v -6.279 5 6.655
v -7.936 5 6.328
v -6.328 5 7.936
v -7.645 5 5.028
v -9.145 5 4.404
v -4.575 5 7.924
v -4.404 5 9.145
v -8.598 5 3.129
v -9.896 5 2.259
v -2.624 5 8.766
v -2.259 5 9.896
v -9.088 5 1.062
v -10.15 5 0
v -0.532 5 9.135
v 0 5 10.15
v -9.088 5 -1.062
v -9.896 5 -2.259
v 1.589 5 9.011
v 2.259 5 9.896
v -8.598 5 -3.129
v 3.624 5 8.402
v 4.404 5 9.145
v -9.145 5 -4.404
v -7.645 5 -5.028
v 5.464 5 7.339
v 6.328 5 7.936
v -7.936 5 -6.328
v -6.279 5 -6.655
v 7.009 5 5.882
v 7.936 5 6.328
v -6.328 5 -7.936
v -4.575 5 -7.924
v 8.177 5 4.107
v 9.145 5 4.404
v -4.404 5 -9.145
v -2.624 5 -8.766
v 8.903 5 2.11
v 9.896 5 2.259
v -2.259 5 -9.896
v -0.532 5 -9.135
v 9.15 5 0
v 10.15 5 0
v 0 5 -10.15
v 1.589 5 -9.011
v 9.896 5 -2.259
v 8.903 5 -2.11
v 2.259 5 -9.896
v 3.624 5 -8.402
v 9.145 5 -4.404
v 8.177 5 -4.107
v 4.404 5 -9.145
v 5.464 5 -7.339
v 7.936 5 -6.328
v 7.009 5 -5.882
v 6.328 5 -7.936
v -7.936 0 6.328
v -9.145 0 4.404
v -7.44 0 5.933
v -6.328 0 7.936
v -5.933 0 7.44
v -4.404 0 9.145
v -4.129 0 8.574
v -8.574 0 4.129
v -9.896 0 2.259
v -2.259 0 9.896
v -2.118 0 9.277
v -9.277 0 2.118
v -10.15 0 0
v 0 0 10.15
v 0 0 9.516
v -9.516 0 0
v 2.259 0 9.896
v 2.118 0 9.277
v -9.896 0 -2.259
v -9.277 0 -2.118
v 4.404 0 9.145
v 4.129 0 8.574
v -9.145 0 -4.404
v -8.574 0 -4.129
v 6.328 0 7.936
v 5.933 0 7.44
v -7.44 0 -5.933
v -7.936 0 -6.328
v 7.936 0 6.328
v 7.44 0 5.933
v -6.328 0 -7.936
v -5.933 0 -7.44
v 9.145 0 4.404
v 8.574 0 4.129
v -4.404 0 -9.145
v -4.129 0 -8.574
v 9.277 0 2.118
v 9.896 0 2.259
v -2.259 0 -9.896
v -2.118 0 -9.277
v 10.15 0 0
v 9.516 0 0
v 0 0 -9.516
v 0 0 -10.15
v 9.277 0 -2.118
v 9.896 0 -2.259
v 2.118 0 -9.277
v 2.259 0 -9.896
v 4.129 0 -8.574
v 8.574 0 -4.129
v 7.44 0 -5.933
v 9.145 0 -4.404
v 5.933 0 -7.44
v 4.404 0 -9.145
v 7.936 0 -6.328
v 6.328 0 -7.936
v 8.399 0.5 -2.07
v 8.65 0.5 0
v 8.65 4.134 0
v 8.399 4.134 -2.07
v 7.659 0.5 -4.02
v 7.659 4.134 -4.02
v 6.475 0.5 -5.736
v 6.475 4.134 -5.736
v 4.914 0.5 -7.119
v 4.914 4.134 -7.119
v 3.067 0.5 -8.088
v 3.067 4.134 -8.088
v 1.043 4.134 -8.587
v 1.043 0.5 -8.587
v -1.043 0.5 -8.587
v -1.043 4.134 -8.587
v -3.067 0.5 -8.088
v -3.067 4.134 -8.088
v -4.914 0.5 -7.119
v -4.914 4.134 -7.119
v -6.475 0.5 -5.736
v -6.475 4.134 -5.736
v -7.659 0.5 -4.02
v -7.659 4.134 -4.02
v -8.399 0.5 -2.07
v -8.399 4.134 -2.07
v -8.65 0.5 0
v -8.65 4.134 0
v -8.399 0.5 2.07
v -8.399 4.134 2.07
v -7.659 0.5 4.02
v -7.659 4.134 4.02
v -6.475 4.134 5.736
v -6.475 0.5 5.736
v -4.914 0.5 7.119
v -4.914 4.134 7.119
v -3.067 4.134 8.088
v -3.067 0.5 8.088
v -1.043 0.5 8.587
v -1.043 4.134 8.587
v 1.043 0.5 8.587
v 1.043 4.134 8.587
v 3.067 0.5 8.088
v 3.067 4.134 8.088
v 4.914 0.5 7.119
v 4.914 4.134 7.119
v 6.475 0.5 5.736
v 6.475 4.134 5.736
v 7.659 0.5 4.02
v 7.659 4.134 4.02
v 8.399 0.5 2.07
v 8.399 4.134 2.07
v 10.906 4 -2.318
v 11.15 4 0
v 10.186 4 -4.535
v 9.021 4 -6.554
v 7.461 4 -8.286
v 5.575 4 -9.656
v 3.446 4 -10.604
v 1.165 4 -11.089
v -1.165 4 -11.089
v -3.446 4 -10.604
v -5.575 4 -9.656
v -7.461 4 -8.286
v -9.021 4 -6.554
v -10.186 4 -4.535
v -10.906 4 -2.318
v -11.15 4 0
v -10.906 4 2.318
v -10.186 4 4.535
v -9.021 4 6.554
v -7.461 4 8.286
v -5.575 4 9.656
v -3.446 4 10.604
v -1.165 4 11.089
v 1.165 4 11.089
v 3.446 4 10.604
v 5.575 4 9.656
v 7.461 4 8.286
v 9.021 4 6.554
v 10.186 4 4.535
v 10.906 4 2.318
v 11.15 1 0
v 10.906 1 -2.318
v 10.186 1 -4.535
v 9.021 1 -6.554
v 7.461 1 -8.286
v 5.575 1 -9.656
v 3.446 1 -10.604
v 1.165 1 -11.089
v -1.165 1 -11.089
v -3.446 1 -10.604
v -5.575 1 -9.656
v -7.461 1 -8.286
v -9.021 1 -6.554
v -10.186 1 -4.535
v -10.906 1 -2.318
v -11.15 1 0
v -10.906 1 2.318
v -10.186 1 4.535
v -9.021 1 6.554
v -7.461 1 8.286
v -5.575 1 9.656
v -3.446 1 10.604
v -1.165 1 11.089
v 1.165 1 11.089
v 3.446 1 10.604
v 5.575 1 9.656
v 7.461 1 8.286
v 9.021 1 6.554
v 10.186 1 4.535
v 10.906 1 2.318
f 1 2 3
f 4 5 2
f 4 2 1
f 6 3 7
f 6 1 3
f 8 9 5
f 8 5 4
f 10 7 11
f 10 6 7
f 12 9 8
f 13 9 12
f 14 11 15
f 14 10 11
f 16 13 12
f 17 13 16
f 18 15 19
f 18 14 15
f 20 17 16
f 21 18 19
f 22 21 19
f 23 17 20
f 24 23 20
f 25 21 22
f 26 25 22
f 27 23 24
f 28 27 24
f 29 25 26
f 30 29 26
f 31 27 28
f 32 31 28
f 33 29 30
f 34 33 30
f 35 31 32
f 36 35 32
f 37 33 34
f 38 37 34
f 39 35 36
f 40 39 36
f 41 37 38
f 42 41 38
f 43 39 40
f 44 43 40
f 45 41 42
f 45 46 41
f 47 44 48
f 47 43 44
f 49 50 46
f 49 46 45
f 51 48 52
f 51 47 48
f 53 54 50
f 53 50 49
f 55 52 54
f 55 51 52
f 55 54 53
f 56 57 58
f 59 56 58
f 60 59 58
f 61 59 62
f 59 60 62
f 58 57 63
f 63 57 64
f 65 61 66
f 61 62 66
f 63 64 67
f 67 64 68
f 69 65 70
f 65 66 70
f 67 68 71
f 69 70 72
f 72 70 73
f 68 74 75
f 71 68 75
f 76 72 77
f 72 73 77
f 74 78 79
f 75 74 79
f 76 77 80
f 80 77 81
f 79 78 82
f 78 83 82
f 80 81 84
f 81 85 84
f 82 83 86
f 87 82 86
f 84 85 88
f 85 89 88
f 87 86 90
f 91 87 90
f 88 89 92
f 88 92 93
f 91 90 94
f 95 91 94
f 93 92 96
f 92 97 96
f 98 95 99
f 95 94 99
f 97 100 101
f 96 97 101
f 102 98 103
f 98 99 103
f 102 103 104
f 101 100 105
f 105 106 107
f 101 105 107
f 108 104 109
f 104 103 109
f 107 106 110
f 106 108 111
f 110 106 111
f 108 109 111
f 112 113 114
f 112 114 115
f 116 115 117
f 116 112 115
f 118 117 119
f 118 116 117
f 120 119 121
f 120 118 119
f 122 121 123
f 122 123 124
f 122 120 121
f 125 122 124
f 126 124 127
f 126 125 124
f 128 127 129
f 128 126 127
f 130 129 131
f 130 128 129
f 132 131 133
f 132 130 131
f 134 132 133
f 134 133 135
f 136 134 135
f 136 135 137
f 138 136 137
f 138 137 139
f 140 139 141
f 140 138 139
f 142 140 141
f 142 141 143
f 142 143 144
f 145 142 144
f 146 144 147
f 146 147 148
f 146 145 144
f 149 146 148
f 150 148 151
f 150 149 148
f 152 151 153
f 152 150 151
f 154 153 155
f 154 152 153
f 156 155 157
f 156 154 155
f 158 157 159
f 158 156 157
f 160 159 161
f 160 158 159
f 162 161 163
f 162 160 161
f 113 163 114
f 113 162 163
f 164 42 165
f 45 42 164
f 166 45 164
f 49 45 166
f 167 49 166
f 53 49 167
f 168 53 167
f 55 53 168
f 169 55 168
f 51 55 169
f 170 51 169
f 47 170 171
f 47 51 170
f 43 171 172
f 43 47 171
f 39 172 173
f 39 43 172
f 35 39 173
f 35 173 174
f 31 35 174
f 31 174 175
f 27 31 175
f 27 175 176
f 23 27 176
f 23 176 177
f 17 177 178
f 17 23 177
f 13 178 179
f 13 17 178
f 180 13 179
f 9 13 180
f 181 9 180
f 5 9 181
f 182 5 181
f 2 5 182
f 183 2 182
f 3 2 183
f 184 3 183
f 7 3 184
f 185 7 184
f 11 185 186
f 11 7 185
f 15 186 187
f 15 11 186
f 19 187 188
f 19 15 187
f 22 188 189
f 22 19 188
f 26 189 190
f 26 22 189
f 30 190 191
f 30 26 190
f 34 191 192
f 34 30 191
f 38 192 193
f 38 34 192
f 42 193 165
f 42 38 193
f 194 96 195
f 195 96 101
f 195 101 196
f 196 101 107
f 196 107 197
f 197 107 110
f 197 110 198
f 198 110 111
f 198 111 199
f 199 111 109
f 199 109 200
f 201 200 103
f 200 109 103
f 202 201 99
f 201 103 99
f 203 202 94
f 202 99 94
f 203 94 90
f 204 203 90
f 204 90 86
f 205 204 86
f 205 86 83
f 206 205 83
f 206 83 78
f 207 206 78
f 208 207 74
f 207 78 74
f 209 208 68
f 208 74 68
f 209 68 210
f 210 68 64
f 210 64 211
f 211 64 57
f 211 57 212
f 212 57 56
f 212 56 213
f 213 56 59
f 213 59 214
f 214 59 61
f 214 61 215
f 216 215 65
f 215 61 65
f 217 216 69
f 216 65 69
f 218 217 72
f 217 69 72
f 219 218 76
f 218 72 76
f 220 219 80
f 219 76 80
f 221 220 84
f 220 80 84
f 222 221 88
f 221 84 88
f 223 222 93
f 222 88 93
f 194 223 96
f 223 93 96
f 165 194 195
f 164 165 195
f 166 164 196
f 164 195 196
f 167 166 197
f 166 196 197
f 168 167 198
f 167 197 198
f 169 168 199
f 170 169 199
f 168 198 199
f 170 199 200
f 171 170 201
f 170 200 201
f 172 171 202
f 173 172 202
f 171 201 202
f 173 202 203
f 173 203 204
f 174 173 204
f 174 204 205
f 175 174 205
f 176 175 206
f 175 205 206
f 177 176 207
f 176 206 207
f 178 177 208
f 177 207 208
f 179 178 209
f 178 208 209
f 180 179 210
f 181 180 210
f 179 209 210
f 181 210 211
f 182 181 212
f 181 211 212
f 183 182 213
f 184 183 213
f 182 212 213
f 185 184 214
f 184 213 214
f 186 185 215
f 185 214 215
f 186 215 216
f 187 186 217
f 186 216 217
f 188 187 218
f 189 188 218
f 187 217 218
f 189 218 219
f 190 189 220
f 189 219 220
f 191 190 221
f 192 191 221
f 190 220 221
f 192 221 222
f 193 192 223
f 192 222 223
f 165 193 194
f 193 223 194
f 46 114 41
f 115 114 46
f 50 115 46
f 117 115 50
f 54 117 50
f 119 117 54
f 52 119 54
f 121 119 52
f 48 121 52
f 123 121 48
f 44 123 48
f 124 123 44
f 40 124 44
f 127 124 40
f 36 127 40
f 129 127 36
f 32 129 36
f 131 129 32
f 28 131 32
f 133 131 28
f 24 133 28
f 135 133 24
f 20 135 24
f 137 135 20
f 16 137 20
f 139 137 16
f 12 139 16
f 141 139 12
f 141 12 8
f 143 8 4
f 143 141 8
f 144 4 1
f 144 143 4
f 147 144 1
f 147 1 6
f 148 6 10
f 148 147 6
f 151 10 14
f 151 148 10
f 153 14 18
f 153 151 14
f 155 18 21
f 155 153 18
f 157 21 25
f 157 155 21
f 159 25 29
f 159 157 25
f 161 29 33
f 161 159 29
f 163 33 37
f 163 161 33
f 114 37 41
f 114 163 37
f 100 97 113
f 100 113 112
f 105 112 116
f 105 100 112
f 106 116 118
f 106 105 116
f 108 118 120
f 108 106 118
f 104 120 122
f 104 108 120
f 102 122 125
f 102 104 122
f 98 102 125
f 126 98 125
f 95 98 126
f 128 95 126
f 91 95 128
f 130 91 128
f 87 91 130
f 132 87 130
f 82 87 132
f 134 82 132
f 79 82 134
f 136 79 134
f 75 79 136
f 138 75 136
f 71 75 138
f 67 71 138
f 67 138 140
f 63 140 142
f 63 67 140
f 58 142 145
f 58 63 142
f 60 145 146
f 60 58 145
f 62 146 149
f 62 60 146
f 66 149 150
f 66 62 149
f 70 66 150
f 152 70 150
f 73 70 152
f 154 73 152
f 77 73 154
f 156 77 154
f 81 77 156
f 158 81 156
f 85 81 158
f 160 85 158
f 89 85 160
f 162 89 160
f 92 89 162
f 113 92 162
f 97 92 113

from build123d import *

# Parameters (mm, degrees)
SKETCH1_R             = 11.15
SKETCH1_R_2           = 8.65
BOSS_EXTRUDE1_DEPTH   = 5
CHAMFER1_SIZE         = 1
CHAMFER2_SIZE         = 0.5
CHAMFER2_SIZE2        = 0.866025404
CHAMFER2_PART_2_SIZE  = 0.5
CHAMFER2_PART_2_SIZE2 = 0.866025404


with BuildPart() as part:
    # Sketch1 → Boss-Extrude1 (new body)
    with BuildSketch(Plane(origin=(0, 0, 0), x_dir=(1, 0, 0), z_dir=(0, 1, 0))):
        Circle(SKETCH1_R)
        Circle(SKETCH1_R_2, mode=Mode.SUBTRACT)
    extrude(amount=BOSS_EXTRUDE1_DEPTH)

    # Chamfer1
    chamfer1_edges = [part.edges().sort_by_distance(p)[0] for p in [
        (-11.15, 0, 0),
        (-11.15, 5, 0),
    ]]
    chamfer(chamfer1_edges, length=CHAMFER1_SIZE)

    # Chamfer2
    chamfer2_edges = [part.edges().sort_by_distance(p)[0] for p in [
        (-8.65, 0, 0),
    ]]
    chamfer2_side = [part.faces().sort_by_distance(p)[0] for p in [
        (-8.65, 2.5, 0),
    ]]
    chamfer(chamfer2_edges, length=CHAMFER2_SIZE, length2=CHAMFER2_SIZE2, reference=chamfer2_side[0])

    # Chamfer2 part 2
    chamfer2_part_2_edges = [part.edges().sort_by_distance(p)[0] for p in [
        (-8.65, 5, 0),
    ]]
    chamfer2_part_2_side = [part.faces().sort_by_distance(p)[0] for p in [
        (-9.862914647, 5, 0),
    ]]
    chamfer(chamfer2_part_2_edges, length=CHAMFER2_PART_2_SIZE, length2=CHAMFER2_PART_2_SIZE2, reference=chamfer2_part_2_side[0])


solid = part.part
